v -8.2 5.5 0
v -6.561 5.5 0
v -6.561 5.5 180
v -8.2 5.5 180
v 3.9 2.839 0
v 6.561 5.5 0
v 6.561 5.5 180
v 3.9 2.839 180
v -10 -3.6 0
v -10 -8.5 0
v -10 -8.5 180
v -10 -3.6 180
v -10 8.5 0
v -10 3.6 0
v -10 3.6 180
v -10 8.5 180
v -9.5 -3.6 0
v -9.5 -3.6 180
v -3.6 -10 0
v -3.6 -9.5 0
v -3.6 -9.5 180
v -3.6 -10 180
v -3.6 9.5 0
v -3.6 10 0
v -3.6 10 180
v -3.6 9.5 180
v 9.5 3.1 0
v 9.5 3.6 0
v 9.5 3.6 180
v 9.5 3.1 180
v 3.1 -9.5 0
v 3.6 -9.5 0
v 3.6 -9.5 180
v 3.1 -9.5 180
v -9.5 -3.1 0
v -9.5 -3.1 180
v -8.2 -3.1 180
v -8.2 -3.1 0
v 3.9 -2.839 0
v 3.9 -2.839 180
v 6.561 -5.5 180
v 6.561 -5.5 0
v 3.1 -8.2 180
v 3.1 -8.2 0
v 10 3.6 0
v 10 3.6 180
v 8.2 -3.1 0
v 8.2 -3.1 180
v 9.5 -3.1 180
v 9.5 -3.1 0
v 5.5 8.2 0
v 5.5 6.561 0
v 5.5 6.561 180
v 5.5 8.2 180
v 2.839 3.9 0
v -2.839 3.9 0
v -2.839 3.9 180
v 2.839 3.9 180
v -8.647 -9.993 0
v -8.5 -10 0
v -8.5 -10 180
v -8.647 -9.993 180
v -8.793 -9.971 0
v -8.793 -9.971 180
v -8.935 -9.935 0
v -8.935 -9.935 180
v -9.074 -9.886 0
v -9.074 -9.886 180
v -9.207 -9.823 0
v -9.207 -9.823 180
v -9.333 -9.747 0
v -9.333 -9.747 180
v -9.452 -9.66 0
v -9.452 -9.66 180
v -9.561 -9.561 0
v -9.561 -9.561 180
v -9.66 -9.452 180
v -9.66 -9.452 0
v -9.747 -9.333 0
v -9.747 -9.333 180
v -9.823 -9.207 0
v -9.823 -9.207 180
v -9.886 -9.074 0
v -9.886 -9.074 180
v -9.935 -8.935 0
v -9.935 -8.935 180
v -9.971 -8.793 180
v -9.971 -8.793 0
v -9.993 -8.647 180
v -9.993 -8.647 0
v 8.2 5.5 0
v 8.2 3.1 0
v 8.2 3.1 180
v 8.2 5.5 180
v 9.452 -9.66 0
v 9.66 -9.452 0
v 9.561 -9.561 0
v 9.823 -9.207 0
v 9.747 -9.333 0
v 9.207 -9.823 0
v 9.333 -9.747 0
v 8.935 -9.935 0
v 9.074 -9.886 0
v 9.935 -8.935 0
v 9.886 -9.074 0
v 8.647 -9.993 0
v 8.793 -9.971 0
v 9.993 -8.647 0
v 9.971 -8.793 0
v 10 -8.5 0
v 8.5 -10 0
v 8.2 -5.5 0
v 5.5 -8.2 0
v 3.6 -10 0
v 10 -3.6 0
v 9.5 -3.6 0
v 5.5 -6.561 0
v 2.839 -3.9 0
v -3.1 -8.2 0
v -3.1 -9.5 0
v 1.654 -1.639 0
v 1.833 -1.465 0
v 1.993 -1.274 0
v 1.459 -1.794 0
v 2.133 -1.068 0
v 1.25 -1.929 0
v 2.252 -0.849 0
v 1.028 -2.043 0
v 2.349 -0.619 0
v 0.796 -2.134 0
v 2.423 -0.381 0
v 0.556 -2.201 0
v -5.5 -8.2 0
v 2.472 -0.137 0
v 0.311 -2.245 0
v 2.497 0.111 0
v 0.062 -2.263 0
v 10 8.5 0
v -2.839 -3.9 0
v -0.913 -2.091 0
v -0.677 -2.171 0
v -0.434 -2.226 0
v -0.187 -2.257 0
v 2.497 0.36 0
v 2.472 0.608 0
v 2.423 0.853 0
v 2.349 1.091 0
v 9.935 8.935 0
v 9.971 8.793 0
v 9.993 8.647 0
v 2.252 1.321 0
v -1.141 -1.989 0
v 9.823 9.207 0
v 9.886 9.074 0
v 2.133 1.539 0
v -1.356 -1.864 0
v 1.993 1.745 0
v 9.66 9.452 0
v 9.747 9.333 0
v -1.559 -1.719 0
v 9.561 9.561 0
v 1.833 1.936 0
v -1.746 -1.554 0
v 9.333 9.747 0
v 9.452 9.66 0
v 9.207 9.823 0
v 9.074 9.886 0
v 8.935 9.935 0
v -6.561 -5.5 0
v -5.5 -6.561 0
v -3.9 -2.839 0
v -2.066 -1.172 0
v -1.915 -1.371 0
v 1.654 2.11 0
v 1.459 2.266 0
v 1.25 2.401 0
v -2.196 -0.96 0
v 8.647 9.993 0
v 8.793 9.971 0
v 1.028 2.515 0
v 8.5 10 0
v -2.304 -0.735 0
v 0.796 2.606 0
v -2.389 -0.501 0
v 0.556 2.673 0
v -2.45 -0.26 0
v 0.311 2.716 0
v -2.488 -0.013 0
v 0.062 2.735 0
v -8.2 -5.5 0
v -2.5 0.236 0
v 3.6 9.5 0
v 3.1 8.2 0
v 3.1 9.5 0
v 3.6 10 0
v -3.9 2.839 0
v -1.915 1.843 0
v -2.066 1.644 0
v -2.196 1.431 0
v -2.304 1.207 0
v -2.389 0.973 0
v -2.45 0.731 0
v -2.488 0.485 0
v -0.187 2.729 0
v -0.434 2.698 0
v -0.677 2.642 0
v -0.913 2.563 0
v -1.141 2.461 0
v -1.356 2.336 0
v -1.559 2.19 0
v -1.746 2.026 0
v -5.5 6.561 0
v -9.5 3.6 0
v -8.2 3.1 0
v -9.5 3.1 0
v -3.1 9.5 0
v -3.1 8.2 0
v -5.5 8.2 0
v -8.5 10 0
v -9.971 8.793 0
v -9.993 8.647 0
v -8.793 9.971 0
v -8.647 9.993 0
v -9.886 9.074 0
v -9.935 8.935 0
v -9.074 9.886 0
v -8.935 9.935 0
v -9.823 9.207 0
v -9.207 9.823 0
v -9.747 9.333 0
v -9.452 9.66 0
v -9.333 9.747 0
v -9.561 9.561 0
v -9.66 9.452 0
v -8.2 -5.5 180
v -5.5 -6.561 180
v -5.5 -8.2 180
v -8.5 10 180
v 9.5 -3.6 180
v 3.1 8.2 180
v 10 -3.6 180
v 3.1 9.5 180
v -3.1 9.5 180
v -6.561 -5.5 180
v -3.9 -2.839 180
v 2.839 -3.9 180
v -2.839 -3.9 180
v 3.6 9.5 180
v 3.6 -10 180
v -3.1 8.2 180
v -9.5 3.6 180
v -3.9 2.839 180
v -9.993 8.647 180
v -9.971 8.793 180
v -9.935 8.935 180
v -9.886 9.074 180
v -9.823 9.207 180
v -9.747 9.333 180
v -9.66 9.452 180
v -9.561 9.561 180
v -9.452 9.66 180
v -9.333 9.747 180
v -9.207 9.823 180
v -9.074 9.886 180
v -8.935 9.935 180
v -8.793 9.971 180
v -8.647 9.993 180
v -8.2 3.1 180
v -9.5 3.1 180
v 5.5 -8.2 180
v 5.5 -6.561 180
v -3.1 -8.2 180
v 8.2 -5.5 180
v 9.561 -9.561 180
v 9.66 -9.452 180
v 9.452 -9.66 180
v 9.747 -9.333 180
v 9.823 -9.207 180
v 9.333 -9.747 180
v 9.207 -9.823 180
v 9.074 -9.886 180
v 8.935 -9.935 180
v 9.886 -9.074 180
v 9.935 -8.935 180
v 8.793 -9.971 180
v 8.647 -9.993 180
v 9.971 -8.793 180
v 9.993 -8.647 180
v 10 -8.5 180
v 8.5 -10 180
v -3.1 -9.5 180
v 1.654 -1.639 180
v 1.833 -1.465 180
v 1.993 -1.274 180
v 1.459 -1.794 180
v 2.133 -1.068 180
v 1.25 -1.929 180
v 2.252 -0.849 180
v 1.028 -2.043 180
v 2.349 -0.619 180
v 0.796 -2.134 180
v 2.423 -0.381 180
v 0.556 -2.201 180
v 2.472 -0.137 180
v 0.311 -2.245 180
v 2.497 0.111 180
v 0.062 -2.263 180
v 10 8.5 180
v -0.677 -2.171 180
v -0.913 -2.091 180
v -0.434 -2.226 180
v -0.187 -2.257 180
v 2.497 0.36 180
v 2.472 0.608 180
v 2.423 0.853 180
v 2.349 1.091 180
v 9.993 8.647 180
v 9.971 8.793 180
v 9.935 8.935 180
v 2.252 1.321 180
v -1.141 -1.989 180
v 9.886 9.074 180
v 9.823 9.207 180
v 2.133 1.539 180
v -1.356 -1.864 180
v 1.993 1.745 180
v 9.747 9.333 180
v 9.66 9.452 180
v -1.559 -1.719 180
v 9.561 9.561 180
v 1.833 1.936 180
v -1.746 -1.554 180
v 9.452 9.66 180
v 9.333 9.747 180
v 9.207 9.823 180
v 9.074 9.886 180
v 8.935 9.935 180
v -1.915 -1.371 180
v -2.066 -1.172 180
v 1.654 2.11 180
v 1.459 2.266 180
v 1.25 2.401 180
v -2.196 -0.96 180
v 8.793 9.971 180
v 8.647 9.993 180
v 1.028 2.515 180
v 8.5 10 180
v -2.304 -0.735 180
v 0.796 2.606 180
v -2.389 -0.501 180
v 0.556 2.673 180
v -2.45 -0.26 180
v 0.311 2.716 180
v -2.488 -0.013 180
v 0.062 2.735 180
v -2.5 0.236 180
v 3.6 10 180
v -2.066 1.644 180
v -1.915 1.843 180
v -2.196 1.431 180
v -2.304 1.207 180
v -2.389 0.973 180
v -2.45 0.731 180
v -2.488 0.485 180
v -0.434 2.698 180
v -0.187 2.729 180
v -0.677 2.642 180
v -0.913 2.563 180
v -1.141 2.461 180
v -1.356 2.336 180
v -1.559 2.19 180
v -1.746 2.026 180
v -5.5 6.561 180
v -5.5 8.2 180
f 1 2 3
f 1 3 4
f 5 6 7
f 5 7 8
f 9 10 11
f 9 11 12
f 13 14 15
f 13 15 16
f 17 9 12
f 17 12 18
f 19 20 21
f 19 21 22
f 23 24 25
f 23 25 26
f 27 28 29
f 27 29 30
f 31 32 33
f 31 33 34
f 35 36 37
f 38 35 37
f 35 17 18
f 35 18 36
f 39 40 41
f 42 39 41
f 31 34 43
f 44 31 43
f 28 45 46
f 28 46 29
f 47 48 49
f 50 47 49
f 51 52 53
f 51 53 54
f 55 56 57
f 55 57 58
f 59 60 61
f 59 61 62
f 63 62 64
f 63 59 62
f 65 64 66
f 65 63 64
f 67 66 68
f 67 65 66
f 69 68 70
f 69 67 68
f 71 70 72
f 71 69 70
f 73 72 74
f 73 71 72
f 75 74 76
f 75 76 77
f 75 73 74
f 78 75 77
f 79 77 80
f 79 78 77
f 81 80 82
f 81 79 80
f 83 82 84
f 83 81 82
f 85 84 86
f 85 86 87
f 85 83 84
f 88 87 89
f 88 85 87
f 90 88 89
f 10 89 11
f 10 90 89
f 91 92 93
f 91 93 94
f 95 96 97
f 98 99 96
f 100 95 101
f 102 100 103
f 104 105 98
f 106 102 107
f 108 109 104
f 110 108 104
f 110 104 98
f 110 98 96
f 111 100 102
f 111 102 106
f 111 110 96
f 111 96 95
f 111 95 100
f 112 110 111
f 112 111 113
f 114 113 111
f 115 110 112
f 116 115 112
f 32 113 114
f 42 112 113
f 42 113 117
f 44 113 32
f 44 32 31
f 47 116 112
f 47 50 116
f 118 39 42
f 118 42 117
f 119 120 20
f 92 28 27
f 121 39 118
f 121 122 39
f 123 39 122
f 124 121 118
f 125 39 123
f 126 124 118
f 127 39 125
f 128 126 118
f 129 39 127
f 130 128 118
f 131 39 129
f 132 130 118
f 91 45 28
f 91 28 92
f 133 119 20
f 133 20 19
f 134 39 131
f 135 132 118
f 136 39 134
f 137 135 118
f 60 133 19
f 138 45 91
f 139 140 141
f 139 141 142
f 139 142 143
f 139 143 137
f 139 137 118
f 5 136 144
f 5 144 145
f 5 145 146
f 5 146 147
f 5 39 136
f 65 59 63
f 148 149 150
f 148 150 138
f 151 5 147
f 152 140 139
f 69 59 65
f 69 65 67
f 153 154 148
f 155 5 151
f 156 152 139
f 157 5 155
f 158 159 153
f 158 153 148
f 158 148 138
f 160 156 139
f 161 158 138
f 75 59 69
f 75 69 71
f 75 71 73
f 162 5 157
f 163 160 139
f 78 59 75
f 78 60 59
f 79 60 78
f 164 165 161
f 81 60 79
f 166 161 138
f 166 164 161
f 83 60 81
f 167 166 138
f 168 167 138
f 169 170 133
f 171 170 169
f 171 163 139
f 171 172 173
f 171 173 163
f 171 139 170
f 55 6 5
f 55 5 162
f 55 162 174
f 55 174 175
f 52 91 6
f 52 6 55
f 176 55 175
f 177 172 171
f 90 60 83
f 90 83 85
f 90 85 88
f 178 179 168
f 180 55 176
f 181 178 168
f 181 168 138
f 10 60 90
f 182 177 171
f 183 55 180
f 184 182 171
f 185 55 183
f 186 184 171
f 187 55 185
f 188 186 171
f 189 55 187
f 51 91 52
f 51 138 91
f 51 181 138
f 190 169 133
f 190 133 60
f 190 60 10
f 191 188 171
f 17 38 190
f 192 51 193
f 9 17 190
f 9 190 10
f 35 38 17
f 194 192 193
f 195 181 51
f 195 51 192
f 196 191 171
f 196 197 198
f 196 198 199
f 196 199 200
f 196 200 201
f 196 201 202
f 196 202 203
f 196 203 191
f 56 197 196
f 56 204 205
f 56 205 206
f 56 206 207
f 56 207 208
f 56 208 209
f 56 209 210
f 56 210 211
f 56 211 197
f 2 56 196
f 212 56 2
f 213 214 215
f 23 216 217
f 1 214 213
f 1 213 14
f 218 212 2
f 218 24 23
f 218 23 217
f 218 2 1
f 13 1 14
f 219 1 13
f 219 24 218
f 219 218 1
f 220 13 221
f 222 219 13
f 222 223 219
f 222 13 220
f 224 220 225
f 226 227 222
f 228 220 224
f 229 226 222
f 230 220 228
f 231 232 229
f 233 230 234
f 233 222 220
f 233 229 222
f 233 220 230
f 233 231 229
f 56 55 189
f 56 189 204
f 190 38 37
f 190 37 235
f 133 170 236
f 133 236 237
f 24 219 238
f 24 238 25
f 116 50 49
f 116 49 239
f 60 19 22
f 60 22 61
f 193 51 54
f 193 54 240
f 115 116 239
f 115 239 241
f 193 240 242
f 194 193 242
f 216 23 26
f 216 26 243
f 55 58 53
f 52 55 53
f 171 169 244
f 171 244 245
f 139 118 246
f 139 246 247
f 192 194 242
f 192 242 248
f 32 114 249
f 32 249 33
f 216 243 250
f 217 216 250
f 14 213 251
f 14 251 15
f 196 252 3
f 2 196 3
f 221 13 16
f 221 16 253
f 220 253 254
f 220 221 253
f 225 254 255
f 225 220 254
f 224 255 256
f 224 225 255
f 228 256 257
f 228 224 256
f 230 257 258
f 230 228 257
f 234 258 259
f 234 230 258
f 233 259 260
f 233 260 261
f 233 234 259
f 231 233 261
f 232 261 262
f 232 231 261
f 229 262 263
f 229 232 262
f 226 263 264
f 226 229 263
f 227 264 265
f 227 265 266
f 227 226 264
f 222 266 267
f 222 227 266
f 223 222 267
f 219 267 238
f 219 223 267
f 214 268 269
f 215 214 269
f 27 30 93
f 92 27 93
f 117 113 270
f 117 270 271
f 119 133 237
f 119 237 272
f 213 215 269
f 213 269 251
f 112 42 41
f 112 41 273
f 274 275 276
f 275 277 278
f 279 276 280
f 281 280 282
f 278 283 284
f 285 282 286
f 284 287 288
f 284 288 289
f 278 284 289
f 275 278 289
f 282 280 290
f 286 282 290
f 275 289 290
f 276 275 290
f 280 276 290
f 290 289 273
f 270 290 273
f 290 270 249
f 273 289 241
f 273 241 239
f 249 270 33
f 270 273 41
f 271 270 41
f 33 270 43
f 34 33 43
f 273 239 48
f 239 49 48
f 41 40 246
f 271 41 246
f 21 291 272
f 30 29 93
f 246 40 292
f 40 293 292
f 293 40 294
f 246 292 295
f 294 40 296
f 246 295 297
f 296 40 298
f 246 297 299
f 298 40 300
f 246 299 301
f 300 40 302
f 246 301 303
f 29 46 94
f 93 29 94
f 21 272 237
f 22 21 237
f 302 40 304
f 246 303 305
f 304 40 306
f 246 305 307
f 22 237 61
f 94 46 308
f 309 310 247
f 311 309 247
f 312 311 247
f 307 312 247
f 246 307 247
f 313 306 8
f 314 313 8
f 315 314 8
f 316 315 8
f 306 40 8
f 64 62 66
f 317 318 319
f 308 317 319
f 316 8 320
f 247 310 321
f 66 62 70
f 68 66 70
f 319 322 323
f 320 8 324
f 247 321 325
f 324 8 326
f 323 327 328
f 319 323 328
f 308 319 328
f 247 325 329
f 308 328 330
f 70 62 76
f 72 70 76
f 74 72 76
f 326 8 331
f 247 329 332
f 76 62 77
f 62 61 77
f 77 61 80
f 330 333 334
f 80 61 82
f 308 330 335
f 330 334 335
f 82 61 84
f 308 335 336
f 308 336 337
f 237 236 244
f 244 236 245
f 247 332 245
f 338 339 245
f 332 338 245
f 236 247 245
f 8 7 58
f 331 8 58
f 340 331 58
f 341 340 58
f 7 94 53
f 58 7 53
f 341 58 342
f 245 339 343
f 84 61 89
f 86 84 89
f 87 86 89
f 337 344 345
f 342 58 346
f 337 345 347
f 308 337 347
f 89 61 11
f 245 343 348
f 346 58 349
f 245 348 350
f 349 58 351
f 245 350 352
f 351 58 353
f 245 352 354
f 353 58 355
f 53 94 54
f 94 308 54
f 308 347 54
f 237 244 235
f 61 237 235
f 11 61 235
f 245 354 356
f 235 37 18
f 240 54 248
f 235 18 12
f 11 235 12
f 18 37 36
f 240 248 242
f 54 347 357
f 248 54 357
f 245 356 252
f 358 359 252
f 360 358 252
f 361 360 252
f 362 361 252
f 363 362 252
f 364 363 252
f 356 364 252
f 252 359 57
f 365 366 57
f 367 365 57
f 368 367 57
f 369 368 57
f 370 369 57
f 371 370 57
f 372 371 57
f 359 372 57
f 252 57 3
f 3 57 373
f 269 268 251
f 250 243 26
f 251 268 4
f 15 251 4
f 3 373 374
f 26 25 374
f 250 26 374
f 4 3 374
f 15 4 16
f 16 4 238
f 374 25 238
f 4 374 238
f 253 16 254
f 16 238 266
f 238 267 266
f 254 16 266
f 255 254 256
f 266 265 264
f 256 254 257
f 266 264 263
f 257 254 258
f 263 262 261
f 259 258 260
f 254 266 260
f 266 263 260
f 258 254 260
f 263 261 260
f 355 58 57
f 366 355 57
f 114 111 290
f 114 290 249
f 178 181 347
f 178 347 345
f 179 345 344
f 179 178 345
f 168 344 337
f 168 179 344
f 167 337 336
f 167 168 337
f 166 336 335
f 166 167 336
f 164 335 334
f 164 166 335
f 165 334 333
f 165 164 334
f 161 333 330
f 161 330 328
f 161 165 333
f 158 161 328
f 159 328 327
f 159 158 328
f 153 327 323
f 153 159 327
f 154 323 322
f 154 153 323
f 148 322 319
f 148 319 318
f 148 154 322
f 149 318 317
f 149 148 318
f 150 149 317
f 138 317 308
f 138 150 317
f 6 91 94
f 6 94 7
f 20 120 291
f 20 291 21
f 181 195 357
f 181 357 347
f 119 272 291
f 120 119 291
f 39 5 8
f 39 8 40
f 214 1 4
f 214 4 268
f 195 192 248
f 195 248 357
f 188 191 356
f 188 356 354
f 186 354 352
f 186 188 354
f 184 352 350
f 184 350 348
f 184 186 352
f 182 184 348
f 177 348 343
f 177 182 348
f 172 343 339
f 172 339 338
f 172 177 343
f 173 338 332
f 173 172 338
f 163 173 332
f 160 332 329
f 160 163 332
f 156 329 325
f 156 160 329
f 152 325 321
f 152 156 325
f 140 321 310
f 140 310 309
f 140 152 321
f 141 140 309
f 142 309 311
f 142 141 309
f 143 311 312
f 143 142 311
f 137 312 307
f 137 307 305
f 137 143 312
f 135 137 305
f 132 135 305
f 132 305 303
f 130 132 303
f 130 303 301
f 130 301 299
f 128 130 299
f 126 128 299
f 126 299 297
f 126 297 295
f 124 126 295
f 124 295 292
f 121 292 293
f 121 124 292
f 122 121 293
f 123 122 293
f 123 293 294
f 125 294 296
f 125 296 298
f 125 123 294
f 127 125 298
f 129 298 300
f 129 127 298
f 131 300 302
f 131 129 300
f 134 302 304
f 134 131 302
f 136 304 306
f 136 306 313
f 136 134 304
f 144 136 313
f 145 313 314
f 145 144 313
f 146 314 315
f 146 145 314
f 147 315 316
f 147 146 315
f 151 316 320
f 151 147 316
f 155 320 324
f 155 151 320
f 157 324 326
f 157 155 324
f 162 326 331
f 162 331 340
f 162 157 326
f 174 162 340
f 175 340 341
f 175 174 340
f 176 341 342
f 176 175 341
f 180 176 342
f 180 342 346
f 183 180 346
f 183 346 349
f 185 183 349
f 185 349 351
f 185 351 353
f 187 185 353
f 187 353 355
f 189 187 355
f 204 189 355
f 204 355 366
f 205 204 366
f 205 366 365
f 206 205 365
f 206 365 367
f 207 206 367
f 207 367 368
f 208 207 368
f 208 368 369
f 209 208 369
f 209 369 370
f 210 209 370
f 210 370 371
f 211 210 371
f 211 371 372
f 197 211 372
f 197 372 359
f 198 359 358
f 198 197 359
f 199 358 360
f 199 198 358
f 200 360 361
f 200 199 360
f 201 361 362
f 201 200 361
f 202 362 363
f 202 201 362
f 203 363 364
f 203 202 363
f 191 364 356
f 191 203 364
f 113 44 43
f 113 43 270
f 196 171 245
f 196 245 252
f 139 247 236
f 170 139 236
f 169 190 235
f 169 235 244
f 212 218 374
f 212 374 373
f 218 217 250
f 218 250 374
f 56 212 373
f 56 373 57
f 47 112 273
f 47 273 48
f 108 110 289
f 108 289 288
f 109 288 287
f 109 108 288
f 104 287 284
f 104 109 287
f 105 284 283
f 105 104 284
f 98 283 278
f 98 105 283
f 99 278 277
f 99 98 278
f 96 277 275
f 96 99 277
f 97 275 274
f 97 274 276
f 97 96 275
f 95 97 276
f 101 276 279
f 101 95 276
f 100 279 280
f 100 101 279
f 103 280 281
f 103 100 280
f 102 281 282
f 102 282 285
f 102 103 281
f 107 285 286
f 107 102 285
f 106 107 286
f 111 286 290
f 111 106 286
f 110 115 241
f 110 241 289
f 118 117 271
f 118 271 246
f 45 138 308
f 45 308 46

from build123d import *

# Parameters (mm, degrees)
SKETCH1_R           = 2.5
BOSS_EXTRUDE1_DEPTH = 180


with BuildPart() as part:
    # Sketch1 → Boss-Extrude1 (new body)
    with BuildSketch(Plane.XY):
        with BuildLine():
            Line((2.839339828, 3.9), (5.5, 6.560660172))
            Line((5.5, 6.560660172), (5.5, 8.2))
            Line((5.5, 8.2), (3.1, 8.2))
            Line((3.1, 8.2), (3.1, 9.5))
            Line((3.1, 9.5), (3.6, 9.5))
            Line((3.6, 9.5), (3.6, 10))
            Line((3.6, 10), (8.5, 10))
            ThreePointArc((8.5, 10), (9.560660172, 9.560660172), (10, 8.5))
            Line((10, 8.5), (10, 3.6))
            Line((10, 3.6), (9.5, 3.6))
            Line((9.5, 3.6), (9.5, 3.1))
            Line((9.5, 3.1), (8.2, 3.1))
            Line((8.2, 3.1), (8.2, 5.5))
            Line((8.2, 5.5), (6.560660172, 5.5))
            Line((6.560660172, 5.5), (3.9, 2.839339828))
            Line((3.9, 2.839339828), (3.9, -2.839339828))
            Line((3.9, -2.839339828), (6.560660172, -5.5))
            Line((6.560660172, -5.5), (8.2, -5.5))
            Line((8.2, -5.5), (8.2, -3.1))
            Line((8.2, -3.1), (9.5, -3.1))
            Line((9.5, -3.1), (9.5, -3.6))
            Line((9.5, -3.6), (10, -3.6))
            Line((10, -3.6), (10, -8.5))
            ThreePointArc((10, -8.5), (9.560660172, -9.560660172), (8.5, -10))
            Line((8.5, -10), (3.6, -10))
            Line((3.6, -10), (3.6, -9.5))
            Line((3.6, -9.5), (3.1, -9.5))
            Line((3.1, -9.5), (3.1, -8.2))
            Line((3.1, -8.2), (5.5, -8.2))
            Line((5.5, -8.2), (5.5, -6.560660172))
            Line((5.5, -6.560660172), (2.839339828, -3.9))
            Line((2.839339828, -3.9), (-2.839339828, -3.9))
            Line((-2.839339828, -3.9), (-5.5, -6.560660172))
            Line((-5.5, -6.560660172), (-5.5, -8.2))
            Line((-5.5, -8.2), (-3.1, -8.2))
            Line((-3.1, -8.2), (-3.1, -9.5))
            Line((-3.1, -9.5), (-3.6, -9.5))
            Line((-3.6, -9.5), (-3.6, -10))
            Line((-3.6, -10), (-8.5, -10))
            ThreePointArc((-8.5, -10), (-9.560660172, -9.560660172), (-10, -8.5))
            Line((-10, -8.5), (-10, -3.6))
            Line((-10, -3.6), (-9.5, -3.6))
            Line((-9.5, -3.6), (-9.5, -3.1))
            Line((-9.5, -3.1), (-8.2, -3.1))
            Line((-8.2, -3.1), (-8.2, -5.5))
            Line((-8.2, -5.5), (-6.560660172, -5.5))
            Line((-6.560660172, -5.5), (-3.9, -2.839339828))
            Line((-3.9, -2.839339828), (-3.9, 2.839339828))
            Line((-3.9, 2.839339828), (-6.560660172, 5.5))
            Line((-6.560660172, 5.5), (-8.2, 5.5))
            Line((-8.2, 5.5), (-8.2, 3.1))
            Line((-8.2, 3.1), (-9.5, 3.1))
            Line((-9.5, 3.1), (-9.5, 3.6))
            Line((-9.5, 3.6), (-10, 3.6))
            Line((-10, 3.6), (-10, 8.5))
            ThreePointArc((-10, 8.5), (-9.560660172, 9.560660172), (-8.5, 10))
            Line((-8.5, 10), (-3.6, 10))
            Line((-3.6, 10), (-3.6, 9.5))
            Line((-3.6, 9.5), (-3.1, 9.5))
            Line((-3.1, 9.5), (-3.1, 8.2))
            Line((-3.1, 8.2), (-5.5, 8.2))
            Line((-5.5, 8.2), (-5.5, 6.560660172))
            Line((-5.5, 6.560660172), (-2.839339828, 3.9))
            Line((-2.839339828, 3.9), (2.839339828, 3.9))
        make_face()
        with Locations(Location((0, 0.235847297, 0), (0, 0, 180))):
            Circle(SKETCH1_R, mode=Mode.SUBTRACT)
    extrude(amount=BOSS_EXTRUDE1_DEPTH)


solid = part.part
